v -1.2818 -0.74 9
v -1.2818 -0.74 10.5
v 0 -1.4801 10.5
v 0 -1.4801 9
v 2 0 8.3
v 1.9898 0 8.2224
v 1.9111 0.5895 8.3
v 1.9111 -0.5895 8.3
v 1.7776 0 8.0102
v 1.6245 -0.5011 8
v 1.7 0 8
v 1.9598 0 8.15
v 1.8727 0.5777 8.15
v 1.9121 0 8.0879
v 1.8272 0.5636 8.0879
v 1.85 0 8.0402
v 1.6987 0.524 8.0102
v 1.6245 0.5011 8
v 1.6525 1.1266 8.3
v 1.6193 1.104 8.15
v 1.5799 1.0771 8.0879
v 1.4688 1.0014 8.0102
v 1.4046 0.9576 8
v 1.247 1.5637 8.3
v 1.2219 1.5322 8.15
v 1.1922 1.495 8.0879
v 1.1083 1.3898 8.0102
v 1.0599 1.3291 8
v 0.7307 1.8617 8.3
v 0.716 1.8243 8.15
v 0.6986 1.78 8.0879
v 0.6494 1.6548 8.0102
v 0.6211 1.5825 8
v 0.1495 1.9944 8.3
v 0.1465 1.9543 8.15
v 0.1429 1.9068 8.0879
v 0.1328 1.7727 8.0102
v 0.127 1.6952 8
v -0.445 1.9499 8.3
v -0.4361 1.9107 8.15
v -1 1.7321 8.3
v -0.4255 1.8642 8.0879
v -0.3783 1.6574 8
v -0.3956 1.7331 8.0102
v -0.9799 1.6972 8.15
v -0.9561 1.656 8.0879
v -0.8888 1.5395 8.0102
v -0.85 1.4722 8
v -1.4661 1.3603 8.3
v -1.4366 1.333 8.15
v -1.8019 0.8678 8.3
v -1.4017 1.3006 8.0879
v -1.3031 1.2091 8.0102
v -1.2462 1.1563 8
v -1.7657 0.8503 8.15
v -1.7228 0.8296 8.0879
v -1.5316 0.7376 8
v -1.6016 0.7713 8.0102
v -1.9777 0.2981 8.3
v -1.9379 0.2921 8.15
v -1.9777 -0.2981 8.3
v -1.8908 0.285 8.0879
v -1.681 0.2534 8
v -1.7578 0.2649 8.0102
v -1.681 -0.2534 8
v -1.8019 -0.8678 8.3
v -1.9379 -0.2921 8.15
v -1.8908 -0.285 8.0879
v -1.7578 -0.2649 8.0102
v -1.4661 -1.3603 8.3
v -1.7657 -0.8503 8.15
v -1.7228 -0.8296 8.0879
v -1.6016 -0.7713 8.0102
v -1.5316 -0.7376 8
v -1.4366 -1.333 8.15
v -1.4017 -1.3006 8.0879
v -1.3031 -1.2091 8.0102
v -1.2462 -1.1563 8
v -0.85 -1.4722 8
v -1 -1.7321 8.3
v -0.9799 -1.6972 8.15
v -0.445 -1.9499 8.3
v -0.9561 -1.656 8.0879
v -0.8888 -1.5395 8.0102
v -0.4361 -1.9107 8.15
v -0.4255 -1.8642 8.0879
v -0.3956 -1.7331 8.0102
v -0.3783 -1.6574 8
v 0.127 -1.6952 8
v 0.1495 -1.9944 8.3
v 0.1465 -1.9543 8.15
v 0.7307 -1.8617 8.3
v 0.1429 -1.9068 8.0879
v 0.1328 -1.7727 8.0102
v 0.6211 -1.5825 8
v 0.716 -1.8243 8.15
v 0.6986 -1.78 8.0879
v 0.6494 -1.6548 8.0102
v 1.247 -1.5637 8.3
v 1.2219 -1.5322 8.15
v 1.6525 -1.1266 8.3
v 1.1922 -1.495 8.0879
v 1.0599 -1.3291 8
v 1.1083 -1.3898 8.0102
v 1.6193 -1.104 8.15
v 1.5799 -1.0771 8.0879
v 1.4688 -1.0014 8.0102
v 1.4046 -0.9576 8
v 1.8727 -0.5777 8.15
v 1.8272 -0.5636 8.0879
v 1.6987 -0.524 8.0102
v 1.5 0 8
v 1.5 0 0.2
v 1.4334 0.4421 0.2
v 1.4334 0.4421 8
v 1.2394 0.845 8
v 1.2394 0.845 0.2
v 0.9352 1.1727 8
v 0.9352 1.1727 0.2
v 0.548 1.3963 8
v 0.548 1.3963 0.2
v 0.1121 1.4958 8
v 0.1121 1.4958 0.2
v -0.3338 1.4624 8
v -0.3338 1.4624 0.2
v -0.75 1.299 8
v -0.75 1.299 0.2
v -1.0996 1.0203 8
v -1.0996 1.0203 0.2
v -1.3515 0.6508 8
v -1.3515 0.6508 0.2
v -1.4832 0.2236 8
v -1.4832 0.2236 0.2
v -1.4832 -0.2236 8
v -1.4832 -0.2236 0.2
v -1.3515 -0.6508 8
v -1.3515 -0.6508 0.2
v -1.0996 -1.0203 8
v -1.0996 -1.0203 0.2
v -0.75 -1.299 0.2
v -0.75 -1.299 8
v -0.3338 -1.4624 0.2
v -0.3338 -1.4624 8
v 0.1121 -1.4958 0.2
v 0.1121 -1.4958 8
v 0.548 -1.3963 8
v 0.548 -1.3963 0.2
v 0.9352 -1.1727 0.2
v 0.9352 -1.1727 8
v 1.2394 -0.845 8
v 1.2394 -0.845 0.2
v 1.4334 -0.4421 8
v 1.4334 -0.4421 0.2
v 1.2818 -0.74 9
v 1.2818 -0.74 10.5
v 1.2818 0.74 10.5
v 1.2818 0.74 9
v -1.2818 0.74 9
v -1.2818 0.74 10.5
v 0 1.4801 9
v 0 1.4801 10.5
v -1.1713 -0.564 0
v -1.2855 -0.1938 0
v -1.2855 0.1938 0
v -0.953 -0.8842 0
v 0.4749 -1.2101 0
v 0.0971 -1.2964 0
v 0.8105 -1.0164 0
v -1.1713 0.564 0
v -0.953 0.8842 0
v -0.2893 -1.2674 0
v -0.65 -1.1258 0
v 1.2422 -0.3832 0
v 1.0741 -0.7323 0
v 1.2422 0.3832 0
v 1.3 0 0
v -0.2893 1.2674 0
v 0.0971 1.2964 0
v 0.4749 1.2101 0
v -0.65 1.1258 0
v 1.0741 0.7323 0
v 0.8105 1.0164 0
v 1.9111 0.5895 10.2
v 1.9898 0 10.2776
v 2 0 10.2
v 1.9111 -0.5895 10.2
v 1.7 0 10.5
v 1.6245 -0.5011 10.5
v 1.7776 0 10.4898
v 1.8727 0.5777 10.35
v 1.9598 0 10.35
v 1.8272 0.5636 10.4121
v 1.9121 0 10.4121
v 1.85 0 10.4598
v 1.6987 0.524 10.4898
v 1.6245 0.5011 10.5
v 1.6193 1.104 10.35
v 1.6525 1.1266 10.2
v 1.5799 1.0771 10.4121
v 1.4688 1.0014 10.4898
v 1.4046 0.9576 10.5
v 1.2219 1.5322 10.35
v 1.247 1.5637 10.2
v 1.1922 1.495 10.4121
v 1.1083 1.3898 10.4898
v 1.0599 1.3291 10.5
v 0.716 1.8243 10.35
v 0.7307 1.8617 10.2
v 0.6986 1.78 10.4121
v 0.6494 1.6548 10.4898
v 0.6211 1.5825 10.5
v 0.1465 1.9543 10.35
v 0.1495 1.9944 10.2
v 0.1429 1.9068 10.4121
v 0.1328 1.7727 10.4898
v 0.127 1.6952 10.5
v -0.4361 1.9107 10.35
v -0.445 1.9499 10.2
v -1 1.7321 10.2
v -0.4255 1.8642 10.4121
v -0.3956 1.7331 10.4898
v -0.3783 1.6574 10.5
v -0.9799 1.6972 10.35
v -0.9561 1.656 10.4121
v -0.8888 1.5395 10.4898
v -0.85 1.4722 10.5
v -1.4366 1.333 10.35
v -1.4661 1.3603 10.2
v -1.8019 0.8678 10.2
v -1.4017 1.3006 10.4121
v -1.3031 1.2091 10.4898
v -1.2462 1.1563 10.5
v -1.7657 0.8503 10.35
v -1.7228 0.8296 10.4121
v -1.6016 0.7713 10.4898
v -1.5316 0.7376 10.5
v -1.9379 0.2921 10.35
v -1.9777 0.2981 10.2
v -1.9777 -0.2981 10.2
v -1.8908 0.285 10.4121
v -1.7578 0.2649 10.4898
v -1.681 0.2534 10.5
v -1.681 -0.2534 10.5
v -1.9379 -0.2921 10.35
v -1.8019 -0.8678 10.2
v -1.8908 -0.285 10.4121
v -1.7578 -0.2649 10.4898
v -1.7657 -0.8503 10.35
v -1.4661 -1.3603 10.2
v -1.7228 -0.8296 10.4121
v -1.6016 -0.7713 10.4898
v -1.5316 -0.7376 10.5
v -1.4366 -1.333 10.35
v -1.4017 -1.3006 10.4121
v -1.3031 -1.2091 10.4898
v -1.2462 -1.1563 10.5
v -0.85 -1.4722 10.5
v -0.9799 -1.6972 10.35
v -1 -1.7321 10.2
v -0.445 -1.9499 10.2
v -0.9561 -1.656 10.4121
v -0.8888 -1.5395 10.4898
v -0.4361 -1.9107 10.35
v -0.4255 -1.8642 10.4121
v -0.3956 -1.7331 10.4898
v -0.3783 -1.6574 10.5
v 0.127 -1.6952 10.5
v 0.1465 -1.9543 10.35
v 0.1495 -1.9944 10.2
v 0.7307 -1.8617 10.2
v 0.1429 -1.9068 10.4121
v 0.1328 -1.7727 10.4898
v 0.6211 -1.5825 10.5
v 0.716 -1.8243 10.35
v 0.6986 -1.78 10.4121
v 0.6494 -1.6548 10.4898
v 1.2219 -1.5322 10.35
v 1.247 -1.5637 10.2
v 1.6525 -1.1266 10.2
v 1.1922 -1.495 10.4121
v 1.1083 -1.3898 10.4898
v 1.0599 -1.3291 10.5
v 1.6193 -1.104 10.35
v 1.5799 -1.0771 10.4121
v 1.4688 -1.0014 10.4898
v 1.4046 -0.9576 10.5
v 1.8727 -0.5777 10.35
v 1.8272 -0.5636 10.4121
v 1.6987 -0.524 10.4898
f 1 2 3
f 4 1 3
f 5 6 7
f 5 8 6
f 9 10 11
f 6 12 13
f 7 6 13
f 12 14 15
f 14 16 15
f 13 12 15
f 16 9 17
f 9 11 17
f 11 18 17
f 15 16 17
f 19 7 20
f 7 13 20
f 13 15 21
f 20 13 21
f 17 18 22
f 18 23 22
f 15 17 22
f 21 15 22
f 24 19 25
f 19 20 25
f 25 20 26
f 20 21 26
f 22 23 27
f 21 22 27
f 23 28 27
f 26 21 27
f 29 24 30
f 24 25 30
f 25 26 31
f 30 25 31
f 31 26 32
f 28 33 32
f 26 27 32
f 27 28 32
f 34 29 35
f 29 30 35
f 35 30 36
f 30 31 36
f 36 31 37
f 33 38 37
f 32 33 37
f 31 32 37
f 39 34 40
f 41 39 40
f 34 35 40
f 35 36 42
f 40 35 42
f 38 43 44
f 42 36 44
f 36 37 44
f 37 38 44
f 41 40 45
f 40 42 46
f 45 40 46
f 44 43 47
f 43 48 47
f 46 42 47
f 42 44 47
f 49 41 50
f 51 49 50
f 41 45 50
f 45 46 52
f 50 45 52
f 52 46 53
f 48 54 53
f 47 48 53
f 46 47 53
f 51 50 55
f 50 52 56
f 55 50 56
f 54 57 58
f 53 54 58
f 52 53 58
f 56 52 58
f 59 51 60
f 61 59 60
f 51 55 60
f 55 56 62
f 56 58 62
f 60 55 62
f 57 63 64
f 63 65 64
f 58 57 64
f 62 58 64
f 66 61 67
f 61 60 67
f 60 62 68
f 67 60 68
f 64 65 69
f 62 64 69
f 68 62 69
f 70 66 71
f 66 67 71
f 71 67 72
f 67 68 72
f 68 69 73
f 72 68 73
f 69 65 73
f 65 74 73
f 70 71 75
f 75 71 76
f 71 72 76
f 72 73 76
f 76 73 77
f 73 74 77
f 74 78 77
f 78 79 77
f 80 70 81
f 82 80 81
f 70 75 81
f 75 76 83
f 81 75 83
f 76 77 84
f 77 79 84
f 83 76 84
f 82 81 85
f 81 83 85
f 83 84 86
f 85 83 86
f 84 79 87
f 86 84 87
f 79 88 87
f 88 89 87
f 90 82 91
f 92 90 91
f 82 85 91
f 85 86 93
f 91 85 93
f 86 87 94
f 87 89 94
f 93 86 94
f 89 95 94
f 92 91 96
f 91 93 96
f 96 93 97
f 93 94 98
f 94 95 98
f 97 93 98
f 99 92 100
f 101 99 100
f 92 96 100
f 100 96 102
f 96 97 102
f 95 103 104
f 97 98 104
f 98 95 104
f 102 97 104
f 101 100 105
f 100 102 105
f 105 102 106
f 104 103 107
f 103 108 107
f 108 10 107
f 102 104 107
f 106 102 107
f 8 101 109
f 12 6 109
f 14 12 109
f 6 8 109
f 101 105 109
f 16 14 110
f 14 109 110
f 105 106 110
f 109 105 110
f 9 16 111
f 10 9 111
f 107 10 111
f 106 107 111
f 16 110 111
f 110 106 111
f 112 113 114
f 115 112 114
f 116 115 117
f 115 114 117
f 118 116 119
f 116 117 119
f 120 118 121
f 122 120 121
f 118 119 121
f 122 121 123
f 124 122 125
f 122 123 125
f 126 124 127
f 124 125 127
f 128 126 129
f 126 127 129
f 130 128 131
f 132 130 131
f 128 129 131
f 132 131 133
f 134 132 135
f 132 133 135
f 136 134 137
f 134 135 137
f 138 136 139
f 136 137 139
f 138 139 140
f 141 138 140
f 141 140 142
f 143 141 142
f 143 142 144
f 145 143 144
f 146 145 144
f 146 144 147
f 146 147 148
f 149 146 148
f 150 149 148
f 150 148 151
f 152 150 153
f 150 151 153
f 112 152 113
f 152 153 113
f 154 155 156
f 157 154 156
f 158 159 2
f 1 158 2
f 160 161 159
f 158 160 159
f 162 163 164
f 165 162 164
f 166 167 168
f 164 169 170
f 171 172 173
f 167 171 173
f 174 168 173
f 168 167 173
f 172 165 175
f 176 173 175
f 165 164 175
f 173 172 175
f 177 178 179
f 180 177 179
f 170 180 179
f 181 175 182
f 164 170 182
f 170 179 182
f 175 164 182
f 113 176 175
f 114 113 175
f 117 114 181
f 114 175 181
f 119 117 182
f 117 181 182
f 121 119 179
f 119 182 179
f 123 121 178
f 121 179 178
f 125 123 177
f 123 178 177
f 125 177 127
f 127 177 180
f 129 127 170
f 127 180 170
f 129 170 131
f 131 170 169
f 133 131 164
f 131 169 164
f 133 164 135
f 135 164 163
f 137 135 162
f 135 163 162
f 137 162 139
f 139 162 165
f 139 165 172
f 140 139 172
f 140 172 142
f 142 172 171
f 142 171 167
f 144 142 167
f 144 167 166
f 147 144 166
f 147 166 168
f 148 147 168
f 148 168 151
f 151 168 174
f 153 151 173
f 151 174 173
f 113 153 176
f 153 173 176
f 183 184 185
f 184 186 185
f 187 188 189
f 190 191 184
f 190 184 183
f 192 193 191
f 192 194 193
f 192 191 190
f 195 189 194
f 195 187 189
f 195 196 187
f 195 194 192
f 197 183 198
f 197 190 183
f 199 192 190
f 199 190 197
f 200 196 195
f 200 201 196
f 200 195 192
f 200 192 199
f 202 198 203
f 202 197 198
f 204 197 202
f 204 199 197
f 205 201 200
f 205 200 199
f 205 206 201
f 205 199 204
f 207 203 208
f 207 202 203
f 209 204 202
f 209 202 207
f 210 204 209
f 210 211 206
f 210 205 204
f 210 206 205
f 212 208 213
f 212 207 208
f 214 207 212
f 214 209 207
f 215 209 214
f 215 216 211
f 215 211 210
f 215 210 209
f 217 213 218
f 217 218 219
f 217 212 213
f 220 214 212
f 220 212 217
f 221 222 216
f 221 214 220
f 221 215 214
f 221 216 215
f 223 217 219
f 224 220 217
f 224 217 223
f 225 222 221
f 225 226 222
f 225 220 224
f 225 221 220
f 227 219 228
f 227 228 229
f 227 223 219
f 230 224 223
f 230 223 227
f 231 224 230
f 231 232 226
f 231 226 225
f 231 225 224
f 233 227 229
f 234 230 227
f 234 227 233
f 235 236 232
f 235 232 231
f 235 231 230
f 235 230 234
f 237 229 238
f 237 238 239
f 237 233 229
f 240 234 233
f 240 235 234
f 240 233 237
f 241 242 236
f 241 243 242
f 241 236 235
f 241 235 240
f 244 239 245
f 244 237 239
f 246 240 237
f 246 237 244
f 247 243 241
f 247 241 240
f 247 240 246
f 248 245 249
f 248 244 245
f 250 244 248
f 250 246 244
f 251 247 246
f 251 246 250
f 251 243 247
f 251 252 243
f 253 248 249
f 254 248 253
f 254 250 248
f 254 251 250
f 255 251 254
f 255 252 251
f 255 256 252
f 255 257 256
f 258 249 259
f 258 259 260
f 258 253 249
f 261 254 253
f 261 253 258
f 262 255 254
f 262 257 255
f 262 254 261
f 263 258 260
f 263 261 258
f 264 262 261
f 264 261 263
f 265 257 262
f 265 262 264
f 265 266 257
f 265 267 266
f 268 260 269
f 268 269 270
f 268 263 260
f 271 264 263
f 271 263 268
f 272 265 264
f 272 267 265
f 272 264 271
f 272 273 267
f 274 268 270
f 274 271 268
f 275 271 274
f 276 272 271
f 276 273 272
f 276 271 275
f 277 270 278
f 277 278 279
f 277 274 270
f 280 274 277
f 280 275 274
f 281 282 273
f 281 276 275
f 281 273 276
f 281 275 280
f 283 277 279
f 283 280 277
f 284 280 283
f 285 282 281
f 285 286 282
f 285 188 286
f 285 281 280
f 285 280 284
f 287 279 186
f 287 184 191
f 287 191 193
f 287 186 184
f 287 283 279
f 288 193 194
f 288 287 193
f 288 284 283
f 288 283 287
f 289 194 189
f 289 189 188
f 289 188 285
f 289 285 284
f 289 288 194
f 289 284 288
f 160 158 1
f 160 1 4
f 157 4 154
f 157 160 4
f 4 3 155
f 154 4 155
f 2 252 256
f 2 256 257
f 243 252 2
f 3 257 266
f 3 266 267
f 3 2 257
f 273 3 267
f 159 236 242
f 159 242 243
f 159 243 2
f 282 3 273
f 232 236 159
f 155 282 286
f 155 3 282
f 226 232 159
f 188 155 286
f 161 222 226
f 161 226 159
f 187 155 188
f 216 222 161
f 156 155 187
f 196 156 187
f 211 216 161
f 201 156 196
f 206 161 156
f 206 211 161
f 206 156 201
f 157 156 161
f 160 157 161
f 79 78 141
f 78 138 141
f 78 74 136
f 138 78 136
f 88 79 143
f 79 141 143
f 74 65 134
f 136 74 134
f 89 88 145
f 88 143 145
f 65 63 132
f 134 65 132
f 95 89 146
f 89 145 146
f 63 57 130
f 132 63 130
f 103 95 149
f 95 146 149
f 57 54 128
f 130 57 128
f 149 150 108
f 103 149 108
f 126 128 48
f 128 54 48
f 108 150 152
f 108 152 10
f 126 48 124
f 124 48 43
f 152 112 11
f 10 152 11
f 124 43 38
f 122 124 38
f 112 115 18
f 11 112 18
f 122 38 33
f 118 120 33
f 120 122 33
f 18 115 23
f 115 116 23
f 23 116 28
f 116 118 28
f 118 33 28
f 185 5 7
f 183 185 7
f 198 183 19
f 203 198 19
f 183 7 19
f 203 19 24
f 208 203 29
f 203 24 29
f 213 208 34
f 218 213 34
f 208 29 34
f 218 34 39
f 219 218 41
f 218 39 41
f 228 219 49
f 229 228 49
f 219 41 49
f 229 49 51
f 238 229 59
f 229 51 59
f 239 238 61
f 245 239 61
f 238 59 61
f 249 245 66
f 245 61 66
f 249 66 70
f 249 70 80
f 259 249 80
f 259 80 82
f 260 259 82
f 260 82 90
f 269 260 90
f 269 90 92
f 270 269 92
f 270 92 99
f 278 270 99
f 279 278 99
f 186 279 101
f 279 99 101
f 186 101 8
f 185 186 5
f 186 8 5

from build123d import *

# Parameters (mm, degrees)
SKETCH_1_R          = 1.5
EXTRUDE_1_DEPTH     = 8
SKETCH_2_R          = 2
EXTRUDE_2_DEPTH     = 2.5
CUT_EXTRUDE_1_DEPTH = 1.5
FILLET_1_R          = 0.3
CHAMFER_1_SIZE      = 0.2


with BuildPart() as part:
    # 草图1 → 凸台-拉伸1 (new body)
    with BuildSketch(Plane.XY):
        Circle(SKETCH_1_R)
    extrude(amount=EXTRUDE_1_DEPTH)

    # 草图2 → 凸台-拉伸2 (add)
    with BuildSketch(Plane.XY.offset(8)):
        Circle(SKETCH_2_R)
    extrude(amount=EXTRUDE_2_DEPTH)

    # 草图3 → 切除-拉伸1 (cut)
    with BuildSketch(Plane.XY.offset(10.5)):
        Polygon((0, 1.480060872), (-1.281770315, 0.740030436), (-1.281770315, -0.740030436), (0, -1.480060872), (1.281770315, -0.740030436), (1.281770315, 0.740030436), align=None)
    extrude(amount=-CUT_EXTRUDE_1_DEPTH, mode=Mode.SUBTRACT)

    # 圆角1
    fillet_1_edges = [part.edges().sort_by_distance(p)[0] for p in [
        (-2, 0, 8),
        (-2, 0, 10.5),
    ]]
    fillet(fillet_1_edges, radius=FILLET_1_R)

    # 倒角1
    chamfer_1_edges = [part.edges().sort_by_distance(p)[0] for p in [
        (-1.5, 0, 0),
    ]]
    chamfer(chamfer_1_edges, length=CHAMFER_1_SIZE)


solid = part.part
